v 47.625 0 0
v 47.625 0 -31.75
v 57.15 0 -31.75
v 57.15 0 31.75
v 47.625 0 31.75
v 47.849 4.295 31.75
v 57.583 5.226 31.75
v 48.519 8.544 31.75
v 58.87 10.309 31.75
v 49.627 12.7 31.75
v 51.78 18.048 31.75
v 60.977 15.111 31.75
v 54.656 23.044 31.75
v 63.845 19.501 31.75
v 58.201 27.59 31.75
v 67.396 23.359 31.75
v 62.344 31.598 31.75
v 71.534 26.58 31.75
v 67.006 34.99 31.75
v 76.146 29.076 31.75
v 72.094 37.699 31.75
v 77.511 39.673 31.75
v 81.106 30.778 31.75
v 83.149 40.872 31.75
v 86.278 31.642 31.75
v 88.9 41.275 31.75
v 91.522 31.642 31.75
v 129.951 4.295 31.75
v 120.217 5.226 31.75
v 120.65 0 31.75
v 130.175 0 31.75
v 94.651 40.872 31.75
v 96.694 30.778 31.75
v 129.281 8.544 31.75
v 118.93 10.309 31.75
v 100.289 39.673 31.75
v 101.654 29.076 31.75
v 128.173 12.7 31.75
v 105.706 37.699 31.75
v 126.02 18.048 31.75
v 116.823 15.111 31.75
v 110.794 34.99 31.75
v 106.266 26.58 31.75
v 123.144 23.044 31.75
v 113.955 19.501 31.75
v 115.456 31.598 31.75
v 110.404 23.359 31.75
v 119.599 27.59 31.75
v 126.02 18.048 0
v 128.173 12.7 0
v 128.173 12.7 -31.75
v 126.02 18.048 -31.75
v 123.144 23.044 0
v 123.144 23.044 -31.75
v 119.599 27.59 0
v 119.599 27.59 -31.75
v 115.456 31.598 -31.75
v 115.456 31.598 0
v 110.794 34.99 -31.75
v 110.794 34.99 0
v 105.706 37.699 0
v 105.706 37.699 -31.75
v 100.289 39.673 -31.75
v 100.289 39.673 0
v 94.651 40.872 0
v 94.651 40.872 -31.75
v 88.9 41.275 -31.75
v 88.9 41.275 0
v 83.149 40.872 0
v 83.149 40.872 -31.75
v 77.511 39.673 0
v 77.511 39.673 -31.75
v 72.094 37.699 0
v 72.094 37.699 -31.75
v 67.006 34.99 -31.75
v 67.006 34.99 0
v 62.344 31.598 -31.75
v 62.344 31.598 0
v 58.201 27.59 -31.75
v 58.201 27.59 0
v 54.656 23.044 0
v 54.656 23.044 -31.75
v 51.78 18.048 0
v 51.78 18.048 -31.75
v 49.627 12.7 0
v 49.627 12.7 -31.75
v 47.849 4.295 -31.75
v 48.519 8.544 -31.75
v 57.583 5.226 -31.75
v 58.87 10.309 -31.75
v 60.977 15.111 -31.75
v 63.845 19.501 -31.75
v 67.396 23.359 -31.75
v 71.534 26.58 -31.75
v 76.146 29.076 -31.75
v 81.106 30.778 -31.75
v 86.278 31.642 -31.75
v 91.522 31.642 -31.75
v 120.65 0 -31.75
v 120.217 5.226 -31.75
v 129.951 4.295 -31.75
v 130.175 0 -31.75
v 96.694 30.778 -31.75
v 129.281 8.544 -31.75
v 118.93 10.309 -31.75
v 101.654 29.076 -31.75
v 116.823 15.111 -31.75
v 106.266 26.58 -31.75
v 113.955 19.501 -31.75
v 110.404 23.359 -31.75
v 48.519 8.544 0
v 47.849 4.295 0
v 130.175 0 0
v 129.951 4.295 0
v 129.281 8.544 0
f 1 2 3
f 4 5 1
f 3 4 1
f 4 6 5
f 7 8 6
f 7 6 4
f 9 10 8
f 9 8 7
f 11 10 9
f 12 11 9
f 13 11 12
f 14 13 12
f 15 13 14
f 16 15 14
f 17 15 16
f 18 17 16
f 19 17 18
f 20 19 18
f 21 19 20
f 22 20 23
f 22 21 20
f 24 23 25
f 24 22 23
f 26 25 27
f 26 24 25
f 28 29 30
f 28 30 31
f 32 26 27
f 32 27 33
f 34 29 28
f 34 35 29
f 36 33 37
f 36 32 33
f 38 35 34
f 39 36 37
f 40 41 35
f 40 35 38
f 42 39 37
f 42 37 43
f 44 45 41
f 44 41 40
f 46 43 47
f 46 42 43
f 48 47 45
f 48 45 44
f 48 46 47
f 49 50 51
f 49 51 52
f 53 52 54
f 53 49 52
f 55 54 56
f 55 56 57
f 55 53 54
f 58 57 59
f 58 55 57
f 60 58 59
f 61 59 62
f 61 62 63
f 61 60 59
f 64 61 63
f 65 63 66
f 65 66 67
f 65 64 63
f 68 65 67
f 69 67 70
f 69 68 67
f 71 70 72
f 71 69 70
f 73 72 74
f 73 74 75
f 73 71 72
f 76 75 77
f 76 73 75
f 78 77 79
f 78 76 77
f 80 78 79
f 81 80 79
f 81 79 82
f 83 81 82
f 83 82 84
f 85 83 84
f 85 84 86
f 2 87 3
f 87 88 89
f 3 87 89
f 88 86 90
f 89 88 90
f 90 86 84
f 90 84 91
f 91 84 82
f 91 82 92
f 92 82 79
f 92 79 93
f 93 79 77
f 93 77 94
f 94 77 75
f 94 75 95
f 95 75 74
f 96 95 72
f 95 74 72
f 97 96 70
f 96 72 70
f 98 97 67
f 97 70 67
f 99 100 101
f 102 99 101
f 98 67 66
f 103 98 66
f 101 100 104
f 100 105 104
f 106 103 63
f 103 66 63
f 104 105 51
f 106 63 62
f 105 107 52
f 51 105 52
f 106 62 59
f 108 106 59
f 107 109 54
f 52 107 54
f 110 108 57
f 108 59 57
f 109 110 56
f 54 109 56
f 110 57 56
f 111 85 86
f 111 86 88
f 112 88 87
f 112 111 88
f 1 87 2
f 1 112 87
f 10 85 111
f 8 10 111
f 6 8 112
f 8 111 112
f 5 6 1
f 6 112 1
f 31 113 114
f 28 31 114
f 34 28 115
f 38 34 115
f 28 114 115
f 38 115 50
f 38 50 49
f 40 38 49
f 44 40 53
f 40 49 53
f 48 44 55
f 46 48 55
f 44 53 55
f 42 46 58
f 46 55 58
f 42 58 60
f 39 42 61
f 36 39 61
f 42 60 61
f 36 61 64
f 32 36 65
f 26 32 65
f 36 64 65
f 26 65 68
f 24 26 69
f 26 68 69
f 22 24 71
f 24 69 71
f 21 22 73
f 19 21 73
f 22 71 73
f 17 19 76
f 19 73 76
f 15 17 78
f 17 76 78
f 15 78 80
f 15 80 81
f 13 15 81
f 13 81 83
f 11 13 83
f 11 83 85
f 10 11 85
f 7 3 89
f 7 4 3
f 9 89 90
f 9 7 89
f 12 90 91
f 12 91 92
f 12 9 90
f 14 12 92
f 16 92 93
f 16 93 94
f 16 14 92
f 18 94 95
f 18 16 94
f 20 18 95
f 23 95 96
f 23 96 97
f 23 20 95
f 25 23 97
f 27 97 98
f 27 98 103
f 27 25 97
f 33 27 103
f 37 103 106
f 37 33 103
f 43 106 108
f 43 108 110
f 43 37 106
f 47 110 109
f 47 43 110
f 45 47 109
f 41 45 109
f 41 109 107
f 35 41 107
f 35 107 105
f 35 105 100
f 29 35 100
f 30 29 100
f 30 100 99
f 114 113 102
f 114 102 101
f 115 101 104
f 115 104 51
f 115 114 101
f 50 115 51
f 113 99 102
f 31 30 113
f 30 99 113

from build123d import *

# Parameters (mm, degrees)
BOSS_EXTRUDE1_DEPTH = 31.75


with BuildPart() as part:
    # Sketch1 → Boss-Extrude1 (new body, symmetric)
    with BuildSketch(Plane.XY):
        with BuildLine():
            ThreePointArc((57.15, 0), (88.9, 31.75), (120.65, 0))
            Line((120.65, 0), (130.175, 0))
            ThreePointArc((130.175, 0), (129.671322086, 6.428446187), (128.172581084, 12.7))
            ThreePointArc((128.172581084, 12.7), (88.9, 41.275), (49.627418916, 12.7))
            ThreePointArc((49.627418916, 12.7), (48.128677914, 6.428446187), (47.625, 0))
            Line((47.625, 0), (57.15, 0))
        make_face()
    extrude(amount=BOSS_EXTRUDE1_DEPTH, both=True)


solid = part.part
